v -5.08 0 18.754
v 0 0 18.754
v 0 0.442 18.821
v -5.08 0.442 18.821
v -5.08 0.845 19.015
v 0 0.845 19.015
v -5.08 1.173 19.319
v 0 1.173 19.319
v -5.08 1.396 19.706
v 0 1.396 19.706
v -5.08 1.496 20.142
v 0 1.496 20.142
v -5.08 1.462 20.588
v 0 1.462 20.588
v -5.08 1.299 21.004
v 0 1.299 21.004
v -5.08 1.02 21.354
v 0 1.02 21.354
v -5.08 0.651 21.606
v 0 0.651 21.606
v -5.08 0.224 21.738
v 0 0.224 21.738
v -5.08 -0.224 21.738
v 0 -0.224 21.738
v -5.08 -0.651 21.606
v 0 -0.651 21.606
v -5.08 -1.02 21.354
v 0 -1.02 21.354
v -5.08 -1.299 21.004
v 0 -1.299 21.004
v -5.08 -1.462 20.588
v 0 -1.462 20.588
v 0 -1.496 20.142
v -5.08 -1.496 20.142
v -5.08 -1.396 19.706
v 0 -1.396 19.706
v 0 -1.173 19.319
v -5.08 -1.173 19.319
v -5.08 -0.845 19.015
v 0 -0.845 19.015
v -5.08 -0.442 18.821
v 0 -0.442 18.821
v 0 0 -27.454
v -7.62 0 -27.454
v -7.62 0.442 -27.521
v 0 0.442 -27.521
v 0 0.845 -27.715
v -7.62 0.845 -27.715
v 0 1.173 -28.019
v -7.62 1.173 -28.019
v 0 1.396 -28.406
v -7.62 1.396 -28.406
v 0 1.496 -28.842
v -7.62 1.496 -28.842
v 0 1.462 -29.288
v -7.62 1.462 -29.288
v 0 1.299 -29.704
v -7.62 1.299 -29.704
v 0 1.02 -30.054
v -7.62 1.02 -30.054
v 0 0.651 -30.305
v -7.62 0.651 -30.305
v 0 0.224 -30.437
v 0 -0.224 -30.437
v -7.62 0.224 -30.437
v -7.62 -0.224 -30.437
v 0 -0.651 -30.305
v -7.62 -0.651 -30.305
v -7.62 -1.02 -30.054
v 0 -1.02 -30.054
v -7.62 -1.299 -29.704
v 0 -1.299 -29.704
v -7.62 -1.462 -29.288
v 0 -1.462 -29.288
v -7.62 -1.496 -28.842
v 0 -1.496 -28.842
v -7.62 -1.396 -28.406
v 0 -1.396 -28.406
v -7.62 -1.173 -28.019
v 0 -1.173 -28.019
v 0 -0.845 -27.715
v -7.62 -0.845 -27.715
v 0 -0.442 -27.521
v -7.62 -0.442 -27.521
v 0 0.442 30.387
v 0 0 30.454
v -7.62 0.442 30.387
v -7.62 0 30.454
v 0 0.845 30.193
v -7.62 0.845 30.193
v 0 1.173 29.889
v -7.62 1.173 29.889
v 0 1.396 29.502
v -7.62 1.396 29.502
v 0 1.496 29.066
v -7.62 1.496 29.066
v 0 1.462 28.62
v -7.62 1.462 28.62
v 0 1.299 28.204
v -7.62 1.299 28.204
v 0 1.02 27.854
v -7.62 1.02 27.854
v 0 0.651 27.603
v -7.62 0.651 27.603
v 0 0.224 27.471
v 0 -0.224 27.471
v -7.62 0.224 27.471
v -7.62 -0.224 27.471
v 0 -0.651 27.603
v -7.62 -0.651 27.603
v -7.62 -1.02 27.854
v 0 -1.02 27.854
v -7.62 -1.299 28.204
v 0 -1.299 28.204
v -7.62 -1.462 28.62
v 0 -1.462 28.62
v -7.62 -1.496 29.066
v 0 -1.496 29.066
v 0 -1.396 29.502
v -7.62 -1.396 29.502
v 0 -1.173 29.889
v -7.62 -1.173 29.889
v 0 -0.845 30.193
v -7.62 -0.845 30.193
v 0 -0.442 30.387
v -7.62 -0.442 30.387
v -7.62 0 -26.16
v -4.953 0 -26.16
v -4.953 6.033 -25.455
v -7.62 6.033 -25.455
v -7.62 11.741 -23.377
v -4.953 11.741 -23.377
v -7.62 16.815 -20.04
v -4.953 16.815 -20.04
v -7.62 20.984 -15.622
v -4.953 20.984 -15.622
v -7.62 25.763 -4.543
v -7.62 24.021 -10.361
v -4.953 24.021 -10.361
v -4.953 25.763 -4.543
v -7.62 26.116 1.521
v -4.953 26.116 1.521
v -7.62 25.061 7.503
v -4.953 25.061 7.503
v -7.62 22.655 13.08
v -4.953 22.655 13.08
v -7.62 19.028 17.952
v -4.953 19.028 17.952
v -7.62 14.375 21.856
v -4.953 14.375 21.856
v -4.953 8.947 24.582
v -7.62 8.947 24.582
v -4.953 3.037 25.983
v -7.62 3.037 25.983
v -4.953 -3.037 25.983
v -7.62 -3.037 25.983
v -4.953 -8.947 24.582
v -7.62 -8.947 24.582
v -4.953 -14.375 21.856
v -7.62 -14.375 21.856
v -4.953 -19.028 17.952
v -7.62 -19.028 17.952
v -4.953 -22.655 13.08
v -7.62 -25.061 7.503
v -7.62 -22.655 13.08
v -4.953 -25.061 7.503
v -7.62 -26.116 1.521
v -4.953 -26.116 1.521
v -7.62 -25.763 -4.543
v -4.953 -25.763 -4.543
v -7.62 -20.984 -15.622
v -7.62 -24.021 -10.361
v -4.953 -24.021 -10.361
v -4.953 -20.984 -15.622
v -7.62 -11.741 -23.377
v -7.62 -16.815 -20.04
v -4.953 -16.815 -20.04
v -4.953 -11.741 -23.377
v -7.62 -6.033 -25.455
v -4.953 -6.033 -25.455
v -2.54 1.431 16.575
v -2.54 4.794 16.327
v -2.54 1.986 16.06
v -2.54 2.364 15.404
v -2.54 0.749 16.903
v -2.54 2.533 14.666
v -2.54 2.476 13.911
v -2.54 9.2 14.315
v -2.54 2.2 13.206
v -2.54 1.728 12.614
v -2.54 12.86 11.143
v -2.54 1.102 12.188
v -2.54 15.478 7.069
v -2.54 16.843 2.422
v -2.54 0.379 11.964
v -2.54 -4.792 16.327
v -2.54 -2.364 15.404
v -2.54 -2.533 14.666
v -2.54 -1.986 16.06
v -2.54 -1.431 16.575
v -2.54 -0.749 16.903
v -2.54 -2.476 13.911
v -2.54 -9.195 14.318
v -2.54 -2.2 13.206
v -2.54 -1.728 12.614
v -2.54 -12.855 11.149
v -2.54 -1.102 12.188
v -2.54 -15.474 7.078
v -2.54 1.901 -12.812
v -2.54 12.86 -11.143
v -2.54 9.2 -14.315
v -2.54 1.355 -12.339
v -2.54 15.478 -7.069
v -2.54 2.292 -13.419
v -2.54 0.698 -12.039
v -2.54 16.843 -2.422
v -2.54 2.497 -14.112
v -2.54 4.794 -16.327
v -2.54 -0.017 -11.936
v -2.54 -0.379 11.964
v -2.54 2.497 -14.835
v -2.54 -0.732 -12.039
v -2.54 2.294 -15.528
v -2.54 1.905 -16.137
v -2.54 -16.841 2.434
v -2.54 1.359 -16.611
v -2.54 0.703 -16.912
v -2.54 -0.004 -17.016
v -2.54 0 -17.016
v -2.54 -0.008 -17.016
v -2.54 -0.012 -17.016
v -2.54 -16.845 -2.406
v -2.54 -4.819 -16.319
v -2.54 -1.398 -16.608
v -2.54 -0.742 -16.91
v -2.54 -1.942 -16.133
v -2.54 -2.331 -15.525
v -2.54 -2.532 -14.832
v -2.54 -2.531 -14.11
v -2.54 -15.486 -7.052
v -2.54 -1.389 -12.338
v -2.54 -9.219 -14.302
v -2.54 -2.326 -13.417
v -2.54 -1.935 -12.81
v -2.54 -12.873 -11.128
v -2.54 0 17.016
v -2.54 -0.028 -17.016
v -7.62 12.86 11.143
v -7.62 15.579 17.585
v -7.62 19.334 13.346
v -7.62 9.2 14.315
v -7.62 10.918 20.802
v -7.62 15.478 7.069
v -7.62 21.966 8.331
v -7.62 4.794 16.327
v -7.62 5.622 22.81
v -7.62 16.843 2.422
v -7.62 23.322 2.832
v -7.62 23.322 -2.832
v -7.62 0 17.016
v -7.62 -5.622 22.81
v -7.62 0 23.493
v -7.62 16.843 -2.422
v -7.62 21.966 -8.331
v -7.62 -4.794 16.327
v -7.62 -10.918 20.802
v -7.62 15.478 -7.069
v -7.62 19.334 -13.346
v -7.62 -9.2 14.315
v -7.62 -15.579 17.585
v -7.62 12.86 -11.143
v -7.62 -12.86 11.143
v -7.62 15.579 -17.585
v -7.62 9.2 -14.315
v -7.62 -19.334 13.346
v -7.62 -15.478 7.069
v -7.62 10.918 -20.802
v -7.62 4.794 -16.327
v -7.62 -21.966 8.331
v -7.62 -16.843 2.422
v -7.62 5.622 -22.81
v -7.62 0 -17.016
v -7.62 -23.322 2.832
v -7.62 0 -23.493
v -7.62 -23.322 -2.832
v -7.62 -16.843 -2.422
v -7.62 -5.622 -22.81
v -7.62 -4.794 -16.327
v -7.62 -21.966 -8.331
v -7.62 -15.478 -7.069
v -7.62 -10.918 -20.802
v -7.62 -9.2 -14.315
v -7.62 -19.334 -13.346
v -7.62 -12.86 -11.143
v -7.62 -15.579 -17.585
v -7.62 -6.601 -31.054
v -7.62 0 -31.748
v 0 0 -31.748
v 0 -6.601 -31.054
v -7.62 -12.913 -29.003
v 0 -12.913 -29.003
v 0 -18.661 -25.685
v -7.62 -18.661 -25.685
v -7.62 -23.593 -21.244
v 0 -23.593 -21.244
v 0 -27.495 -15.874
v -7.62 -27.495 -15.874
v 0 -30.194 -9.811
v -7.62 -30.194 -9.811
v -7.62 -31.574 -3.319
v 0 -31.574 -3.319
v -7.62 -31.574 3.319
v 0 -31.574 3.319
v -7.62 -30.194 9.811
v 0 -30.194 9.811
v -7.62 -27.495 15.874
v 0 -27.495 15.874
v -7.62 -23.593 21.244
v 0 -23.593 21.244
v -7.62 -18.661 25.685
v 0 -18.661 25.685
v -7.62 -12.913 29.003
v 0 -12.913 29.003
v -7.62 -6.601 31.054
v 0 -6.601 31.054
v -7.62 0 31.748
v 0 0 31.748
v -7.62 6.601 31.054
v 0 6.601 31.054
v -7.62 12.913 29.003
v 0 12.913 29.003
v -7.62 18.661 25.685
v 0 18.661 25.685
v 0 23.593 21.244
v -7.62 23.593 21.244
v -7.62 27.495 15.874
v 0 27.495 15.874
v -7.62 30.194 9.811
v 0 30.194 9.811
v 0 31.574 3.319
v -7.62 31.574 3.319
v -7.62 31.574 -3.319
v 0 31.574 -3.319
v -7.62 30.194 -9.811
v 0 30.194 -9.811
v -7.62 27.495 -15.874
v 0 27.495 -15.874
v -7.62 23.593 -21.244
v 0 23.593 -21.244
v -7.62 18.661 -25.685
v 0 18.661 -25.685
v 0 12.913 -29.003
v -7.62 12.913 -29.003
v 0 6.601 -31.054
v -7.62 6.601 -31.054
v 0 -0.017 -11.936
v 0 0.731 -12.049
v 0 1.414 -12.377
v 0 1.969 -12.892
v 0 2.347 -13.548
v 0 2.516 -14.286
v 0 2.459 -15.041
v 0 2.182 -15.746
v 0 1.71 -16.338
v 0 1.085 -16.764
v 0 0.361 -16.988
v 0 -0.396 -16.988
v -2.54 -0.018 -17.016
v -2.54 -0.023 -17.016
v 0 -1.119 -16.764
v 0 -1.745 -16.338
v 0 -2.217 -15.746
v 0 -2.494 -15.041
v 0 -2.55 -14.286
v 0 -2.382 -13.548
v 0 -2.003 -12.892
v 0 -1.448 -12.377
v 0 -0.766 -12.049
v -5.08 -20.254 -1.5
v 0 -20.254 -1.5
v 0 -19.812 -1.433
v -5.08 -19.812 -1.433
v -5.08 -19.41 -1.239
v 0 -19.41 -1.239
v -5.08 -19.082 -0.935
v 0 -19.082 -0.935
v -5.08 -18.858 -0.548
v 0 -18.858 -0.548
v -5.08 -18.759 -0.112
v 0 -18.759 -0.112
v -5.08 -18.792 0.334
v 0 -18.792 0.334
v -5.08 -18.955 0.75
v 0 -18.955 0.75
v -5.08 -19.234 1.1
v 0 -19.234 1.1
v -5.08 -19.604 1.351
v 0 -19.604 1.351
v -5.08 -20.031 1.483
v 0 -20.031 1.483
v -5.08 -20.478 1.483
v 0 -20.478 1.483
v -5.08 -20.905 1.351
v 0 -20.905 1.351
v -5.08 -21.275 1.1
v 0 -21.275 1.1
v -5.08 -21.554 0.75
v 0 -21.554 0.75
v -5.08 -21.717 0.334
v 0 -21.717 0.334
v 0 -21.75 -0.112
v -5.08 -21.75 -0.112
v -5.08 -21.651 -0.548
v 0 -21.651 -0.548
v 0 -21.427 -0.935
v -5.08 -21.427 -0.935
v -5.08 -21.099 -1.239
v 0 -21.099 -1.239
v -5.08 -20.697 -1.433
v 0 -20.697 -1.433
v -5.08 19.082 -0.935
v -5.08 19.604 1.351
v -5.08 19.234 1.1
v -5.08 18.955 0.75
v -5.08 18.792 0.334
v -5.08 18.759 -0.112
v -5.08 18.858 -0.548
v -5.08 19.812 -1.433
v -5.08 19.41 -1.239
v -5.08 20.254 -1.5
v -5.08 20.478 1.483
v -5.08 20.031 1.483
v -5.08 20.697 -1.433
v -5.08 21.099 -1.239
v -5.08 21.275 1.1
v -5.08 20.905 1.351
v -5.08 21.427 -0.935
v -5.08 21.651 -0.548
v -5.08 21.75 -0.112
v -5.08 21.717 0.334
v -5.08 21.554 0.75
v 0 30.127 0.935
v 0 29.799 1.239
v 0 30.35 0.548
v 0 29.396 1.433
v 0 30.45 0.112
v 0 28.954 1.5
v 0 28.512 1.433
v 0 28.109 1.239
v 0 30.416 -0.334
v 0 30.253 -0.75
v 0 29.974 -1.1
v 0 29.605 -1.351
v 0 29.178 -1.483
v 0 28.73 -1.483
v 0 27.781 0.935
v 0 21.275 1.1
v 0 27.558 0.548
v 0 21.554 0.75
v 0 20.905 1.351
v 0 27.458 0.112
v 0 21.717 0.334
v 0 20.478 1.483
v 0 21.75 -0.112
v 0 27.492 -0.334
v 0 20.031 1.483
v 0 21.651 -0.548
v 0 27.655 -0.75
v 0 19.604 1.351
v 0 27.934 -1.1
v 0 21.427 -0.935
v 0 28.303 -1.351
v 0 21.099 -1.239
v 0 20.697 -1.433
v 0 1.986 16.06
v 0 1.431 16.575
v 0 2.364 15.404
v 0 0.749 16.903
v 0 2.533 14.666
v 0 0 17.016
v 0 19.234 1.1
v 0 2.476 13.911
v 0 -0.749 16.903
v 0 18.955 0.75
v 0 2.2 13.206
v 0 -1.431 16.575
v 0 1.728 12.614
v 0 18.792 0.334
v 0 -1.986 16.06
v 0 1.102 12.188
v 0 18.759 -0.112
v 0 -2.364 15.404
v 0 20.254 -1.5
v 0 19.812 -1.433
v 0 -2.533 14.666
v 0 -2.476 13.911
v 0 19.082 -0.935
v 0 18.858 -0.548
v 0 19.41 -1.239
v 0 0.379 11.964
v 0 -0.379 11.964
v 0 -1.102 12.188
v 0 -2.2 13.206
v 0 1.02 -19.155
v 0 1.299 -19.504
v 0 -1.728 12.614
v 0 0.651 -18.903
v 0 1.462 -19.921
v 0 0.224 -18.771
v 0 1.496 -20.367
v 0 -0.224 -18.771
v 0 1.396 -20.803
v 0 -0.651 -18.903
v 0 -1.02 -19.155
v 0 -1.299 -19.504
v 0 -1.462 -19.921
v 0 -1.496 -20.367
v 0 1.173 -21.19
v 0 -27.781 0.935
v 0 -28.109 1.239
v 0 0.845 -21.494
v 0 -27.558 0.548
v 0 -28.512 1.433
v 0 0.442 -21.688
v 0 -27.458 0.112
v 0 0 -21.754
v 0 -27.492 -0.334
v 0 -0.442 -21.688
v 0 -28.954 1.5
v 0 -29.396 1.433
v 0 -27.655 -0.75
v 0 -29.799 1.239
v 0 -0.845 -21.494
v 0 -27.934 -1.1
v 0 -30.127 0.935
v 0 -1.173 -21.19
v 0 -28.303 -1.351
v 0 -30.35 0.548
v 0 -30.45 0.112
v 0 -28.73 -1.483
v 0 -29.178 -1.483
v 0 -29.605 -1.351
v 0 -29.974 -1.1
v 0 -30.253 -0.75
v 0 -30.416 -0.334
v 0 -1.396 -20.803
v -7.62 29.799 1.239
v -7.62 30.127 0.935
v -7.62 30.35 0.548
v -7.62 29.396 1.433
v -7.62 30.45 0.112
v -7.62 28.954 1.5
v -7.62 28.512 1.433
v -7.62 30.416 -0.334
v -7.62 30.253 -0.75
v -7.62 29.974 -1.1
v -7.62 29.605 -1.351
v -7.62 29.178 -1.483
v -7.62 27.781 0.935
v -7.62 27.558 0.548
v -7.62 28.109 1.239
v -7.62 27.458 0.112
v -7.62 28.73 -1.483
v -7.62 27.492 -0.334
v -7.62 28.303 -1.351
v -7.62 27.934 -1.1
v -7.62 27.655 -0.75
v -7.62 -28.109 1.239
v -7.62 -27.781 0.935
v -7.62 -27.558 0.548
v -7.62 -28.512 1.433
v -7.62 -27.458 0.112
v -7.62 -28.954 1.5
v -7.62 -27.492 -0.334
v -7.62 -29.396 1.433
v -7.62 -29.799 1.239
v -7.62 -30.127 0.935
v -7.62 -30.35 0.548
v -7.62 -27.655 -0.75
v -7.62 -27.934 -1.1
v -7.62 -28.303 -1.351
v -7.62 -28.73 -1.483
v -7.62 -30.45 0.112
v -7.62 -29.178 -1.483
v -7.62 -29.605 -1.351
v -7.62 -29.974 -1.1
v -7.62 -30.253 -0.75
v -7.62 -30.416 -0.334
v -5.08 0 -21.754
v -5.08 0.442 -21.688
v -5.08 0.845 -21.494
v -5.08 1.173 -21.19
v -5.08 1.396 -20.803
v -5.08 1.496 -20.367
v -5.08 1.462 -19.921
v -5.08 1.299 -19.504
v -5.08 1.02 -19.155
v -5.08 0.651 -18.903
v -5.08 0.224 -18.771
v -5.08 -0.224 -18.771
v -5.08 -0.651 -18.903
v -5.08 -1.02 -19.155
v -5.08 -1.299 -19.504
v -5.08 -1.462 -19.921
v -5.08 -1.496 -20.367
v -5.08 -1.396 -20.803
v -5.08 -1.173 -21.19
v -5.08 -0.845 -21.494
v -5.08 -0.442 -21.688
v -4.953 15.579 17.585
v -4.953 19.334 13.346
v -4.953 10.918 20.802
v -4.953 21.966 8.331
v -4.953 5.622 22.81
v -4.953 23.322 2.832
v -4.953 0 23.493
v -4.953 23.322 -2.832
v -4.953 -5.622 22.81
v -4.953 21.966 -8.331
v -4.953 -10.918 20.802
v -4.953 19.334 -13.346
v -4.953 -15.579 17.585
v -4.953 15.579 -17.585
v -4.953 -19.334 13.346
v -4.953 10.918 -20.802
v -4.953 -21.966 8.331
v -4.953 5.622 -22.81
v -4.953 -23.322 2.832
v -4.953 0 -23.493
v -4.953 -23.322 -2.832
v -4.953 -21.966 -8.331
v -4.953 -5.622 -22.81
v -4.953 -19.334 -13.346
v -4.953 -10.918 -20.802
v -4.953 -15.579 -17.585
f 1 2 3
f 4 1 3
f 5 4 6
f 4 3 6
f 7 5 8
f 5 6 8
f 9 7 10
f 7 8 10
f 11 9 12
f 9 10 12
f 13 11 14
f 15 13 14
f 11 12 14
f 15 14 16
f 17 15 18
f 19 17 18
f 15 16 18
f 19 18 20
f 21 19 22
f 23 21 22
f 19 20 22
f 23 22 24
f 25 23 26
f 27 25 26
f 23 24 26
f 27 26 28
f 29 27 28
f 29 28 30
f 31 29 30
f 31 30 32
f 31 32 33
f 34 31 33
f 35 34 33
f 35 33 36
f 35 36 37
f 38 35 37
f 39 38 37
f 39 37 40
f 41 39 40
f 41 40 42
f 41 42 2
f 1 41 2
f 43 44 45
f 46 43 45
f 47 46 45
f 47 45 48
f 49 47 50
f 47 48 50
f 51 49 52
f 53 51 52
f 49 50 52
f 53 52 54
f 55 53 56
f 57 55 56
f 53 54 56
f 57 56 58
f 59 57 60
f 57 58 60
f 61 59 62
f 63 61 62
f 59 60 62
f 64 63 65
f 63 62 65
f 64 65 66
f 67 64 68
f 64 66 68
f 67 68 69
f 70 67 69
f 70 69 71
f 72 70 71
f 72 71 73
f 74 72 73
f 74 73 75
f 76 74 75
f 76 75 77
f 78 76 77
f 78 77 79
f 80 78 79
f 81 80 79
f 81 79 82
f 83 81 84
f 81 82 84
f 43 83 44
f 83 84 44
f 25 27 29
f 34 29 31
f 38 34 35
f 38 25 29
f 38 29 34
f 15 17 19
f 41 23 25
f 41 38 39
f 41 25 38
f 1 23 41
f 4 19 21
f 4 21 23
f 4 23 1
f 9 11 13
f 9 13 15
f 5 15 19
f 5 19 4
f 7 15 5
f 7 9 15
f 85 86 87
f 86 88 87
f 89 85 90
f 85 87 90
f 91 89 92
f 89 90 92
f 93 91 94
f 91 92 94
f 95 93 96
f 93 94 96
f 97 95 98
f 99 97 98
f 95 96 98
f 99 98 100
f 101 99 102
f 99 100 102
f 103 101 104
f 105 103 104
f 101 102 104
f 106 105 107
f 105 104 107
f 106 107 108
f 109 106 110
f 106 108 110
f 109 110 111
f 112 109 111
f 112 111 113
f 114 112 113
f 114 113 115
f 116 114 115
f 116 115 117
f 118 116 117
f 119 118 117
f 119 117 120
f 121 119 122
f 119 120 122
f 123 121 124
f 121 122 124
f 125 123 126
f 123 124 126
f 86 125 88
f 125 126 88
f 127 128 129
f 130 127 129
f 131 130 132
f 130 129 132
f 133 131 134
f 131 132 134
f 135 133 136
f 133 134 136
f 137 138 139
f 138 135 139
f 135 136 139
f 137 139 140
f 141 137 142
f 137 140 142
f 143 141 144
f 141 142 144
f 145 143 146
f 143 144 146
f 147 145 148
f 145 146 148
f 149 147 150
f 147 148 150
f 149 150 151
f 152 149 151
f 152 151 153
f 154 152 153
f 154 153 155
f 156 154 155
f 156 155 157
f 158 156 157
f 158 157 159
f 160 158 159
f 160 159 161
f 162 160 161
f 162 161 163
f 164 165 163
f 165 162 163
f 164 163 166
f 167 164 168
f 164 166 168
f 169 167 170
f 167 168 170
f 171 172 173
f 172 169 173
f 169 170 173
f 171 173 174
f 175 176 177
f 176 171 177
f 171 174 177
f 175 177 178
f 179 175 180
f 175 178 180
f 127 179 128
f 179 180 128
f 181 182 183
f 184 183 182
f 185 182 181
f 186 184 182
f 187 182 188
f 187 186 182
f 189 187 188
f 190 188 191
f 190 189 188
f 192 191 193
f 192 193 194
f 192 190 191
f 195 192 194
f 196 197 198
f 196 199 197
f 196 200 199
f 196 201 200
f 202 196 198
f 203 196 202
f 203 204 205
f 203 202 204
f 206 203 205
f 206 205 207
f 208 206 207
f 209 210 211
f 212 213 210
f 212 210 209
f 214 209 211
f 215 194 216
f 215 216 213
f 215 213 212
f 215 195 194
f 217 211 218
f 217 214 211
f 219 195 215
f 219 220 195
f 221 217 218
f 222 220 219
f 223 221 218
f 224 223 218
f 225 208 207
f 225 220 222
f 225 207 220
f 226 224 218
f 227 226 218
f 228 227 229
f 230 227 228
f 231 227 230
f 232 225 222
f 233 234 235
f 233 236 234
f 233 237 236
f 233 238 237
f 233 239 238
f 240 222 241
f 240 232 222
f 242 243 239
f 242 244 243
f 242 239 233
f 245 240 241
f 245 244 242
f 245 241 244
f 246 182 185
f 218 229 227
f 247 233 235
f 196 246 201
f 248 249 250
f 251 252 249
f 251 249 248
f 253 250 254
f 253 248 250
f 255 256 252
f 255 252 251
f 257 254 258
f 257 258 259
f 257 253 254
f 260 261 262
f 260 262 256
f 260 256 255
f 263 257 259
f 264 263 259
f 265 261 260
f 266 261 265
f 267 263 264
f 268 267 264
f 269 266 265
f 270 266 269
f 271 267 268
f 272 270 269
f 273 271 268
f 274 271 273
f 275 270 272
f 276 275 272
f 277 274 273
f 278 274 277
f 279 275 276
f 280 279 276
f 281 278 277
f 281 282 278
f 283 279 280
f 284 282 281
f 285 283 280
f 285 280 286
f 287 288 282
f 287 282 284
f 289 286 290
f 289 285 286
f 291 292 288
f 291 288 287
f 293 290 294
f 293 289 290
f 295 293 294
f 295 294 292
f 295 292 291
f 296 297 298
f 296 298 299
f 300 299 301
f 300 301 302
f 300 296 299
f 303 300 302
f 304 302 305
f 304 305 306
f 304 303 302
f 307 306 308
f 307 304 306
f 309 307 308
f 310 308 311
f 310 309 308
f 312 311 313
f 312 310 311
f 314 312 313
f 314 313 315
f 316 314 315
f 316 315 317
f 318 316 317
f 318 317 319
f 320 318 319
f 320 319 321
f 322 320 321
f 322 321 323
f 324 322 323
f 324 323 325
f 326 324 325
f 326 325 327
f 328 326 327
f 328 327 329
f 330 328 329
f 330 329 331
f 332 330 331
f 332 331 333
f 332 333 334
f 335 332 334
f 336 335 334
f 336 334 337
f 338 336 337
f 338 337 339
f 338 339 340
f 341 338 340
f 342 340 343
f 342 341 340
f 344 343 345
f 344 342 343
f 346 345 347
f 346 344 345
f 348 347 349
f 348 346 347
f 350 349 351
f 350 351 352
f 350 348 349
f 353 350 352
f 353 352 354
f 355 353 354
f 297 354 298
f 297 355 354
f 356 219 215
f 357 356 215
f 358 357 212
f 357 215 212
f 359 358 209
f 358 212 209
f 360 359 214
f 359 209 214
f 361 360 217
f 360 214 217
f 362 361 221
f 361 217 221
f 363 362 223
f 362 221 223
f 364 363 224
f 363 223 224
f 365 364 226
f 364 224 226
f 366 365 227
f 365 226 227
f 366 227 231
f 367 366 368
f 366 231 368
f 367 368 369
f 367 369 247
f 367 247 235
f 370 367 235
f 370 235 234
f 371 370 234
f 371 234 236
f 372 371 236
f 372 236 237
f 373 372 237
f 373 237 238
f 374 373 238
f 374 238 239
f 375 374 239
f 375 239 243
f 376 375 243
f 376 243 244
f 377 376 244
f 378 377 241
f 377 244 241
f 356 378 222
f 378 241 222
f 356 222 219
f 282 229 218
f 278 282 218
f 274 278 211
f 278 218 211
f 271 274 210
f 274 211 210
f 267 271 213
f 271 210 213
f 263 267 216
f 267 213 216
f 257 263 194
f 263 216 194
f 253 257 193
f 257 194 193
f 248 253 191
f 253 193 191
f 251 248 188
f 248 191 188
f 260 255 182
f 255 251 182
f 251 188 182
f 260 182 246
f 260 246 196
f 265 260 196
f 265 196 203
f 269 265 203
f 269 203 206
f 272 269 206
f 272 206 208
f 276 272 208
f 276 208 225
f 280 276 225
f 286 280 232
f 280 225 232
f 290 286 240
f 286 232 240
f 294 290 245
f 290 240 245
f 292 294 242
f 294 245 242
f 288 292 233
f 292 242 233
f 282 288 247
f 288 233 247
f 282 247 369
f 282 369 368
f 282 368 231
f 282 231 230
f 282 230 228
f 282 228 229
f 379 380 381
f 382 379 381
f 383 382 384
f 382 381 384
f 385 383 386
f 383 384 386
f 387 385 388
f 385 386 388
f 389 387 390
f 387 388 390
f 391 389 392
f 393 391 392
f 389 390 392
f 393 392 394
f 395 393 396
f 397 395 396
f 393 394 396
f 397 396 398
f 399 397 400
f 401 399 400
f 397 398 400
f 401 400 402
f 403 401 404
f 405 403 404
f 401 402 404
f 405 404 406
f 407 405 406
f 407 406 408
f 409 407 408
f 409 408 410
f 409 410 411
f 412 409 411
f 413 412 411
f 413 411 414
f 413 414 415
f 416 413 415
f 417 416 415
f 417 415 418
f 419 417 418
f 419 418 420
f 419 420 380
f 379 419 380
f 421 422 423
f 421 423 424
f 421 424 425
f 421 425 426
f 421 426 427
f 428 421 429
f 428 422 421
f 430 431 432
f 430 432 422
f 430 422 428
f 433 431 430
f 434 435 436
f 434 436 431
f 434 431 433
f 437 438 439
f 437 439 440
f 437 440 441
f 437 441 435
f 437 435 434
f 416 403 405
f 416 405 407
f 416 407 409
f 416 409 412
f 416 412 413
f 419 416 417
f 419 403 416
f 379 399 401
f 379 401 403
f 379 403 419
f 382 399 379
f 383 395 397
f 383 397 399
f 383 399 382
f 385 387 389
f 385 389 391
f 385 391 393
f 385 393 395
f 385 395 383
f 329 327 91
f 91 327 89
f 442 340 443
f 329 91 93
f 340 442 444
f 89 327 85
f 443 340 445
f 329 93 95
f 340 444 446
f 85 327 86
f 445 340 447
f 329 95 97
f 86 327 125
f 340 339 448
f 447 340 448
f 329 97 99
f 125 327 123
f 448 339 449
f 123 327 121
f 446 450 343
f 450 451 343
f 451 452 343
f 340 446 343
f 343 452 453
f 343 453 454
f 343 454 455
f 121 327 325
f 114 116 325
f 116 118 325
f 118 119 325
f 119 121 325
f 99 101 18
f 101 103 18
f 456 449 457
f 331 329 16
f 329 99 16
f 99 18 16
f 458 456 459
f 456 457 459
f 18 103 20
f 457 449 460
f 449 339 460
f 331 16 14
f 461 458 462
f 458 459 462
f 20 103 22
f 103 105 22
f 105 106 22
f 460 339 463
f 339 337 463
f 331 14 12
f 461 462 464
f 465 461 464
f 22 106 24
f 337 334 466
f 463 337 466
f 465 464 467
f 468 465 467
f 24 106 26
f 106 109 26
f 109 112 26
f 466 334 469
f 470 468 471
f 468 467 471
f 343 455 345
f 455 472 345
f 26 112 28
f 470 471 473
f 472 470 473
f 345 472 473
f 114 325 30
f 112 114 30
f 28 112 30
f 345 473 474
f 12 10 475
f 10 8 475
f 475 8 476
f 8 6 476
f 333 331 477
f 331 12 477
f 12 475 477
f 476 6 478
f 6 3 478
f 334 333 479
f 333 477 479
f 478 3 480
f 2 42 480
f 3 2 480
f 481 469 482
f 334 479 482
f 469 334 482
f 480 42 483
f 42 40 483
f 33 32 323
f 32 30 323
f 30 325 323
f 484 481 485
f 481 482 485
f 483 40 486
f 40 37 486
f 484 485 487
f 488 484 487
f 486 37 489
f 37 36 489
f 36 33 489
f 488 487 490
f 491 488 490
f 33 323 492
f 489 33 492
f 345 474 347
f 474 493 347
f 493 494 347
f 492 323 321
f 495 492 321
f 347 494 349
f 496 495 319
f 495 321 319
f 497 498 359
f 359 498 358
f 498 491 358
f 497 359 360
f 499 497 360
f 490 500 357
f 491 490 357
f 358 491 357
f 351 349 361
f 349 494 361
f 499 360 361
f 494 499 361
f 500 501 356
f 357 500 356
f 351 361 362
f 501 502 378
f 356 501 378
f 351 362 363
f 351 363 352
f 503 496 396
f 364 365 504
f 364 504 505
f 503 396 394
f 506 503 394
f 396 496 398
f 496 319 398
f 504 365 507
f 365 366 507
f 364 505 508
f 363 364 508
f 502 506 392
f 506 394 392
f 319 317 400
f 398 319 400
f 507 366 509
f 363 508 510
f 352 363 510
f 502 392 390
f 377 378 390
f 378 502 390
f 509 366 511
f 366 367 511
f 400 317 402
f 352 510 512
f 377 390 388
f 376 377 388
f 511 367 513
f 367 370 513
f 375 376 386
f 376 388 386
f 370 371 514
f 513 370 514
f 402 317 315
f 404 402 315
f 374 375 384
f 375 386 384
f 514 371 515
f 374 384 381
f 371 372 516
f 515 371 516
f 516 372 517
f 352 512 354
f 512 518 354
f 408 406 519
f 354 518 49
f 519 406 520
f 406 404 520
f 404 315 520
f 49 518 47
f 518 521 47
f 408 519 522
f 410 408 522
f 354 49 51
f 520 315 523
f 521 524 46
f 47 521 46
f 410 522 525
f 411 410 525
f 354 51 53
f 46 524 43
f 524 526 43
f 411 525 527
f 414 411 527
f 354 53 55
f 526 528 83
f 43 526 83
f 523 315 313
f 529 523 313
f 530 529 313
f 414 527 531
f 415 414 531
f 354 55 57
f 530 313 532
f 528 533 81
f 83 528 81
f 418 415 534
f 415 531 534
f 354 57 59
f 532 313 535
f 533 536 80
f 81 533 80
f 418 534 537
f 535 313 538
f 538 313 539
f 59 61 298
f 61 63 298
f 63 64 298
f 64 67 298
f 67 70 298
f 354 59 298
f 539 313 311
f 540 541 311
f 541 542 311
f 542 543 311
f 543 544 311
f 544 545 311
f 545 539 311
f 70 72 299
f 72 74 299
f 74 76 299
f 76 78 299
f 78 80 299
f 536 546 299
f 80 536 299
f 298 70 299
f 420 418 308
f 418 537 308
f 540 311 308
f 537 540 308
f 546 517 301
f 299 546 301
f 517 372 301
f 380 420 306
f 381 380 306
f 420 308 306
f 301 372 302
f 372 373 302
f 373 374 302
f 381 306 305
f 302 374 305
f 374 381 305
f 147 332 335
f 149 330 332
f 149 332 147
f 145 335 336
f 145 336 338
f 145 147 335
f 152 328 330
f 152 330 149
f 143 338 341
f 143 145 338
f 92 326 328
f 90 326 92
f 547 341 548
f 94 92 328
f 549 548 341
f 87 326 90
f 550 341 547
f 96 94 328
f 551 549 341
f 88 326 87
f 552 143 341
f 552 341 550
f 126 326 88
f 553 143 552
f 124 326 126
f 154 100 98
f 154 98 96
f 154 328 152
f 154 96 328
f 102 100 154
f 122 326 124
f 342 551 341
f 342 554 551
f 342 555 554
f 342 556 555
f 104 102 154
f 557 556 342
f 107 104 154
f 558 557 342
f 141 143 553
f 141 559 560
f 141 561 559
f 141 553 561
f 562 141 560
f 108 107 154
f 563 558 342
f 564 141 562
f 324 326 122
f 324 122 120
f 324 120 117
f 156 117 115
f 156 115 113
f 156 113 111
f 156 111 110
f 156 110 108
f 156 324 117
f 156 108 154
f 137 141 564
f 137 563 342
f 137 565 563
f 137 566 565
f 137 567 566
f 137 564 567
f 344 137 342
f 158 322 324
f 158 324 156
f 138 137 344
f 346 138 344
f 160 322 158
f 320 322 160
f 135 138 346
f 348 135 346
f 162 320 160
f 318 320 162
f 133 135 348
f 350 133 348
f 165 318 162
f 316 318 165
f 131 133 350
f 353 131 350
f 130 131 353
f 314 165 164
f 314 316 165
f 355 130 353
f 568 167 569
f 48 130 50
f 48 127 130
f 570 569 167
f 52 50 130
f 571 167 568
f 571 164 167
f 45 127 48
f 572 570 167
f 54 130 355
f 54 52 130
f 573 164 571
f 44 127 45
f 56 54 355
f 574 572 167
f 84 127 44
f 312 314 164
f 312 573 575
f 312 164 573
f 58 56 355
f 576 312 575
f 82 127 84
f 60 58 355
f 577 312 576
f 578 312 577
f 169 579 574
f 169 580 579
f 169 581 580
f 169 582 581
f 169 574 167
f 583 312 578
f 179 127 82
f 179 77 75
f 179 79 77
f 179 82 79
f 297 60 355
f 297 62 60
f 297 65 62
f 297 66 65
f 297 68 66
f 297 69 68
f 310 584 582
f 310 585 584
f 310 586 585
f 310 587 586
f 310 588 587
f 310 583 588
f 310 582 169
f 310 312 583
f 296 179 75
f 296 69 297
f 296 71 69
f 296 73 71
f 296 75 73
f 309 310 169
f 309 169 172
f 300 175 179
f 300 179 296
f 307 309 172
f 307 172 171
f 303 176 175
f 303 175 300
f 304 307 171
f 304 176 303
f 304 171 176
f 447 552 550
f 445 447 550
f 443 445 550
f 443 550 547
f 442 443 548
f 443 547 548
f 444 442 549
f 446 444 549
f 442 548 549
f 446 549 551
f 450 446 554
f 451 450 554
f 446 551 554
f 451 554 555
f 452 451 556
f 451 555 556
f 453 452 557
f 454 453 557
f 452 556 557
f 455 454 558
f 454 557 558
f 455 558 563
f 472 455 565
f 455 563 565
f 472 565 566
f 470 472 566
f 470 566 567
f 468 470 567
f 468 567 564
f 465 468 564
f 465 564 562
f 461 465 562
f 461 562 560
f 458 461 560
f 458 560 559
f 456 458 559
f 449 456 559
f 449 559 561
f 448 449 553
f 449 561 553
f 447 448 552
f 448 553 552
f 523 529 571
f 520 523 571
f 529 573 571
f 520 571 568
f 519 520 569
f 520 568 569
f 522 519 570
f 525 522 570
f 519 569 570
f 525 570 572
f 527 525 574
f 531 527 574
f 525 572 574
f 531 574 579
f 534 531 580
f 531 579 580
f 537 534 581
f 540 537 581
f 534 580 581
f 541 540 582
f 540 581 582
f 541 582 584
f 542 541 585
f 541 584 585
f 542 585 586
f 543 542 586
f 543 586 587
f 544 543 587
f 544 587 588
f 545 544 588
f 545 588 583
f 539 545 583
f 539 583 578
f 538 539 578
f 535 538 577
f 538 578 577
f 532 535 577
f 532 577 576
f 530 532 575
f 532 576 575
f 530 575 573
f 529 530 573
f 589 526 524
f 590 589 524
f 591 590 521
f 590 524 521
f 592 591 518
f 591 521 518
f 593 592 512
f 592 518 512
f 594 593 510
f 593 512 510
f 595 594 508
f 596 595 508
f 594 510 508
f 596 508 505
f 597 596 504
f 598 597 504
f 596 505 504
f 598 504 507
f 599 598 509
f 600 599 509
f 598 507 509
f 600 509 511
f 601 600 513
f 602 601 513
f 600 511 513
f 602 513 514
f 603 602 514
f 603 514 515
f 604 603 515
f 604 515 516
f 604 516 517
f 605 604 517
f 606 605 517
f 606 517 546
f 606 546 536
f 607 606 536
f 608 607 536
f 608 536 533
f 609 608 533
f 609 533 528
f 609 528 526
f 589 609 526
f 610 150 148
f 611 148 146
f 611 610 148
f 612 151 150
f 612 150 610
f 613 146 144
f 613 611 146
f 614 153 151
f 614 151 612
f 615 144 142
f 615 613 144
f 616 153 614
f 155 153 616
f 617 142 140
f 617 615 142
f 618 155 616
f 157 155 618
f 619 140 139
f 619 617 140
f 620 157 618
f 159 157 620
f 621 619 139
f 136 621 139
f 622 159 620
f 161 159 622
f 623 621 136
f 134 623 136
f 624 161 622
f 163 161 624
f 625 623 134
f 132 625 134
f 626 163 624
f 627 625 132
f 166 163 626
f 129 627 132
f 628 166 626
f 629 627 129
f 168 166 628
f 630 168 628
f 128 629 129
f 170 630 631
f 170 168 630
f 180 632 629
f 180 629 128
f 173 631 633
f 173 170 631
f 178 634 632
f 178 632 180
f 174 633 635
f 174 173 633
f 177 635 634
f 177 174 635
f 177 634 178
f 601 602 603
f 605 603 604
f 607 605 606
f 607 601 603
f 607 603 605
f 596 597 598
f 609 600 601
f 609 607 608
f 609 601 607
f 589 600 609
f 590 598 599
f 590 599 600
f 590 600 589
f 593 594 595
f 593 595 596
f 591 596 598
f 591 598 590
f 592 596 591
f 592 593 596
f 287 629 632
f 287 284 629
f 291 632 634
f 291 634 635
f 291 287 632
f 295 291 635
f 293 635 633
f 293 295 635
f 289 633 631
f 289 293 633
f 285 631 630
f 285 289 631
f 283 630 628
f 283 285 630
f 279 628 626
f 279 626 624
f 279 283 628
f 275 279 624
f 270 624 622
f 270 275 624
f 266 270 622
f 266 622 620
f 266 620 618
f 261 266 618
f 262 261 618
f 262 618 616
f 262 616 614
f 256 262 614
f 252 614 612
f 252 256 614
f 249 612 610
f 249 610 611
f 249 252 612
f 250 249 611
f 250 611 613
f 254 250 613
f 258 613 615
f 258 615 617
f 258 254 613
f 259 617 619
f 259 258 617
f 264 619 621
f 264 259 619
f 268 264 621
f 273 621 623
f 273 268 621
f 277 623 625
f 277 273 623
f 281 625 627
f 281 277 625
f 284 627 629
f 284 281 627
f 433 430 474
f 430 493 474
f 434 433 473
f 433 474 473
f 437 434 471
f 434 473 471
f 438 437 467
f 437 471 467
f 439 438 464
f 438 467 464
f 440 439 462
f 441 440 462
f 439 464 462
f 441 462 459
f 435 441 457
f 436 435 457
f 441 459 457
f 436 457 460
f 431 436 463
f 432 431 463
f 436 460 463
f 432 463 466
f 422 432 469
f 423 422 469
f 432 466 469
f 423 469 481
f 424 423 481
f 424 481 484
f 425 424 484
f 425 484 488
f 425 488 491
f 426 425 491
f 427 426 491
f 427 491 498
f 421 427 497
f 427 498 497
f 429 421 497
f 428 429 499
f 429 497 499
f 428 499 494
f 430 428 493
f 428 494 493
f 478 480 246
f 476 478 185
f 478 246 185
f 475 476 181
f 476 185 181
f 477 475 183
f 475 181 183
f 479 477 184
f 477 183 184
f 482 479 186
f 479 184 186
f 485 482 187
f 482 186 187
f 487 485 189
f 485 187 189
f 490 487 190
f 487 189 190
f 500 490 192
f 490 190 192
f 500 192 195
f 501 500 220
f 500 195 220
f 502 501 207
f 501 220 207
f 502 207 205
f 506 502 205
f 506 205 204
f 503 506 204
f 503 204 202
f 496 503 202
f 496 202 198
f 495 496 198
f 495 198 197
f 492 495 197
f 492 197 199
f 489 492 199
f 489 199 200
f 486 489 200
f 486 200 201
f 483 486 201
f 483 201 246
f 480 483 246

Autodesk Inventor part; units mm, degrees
ref_plane "YZ Plane" through (0, 0, 0) normal (1, 0, 0) x (0, 1, 0)
ref_plane "XZ Plane" through (0, 0, 0) normal (0, 1, 0) x (-1, 0, 0)
ref_plane "XY Plane" through (0, 0, 0) normal (0, 0, 1) x (1, 0, 0)
sketch "Sketch1" plane through (0, 0, 0) normal (0, 1, 0) x (-1, 0, 0)
  line L0 (0, 0) -> (0, -31.748)
  line L1 (0, -31.748) -> (7.62, -31.748)
  line L2 (7.62, -31.748) -> (7.62, -26.16)
  line L3 (7.62, -26.16) -> (4.953, -26.16)
  line L4 (4.953, -26.16) -> (4.953, -23.493)
  line L5 (4.953, -23.493) -> (7.62, -23.493)
  line L6 (7.62, -23.493) -> (7.62, -17.016)
  line L7 (7.62, -17.016) -> (2.54, -17.016)
  line L8 (2.54, -17.016) -> (2.54, 0)
  line L9 (0, 0) -> (2.54, 0)
  dimension "d0" = 31.748
  dimension "d1" = 7.62
  dimension "d2" = 5.588
  dimension "d3" = 2.667
  dimension "d4" = 2.667
  dimension "d5" = 6.477
  dimension "d6" = 5.08
  dimension "d7" = 2.54
revolve "Revolution1" add sketch "Sketch1" angle 360 about axis through (0, 0, 0) along (-1, 0, 0)
sketch "Sketch2" plane through (-7.62, 0, 0) normal (-1, 0, 0) x (0, 0, 1)
  circle A0 centre (28.954, 0) radius 1.5
  circle A1 centre (0, 0) radius 31.748 projected
  line L0 (31.748, 0) -> (26.16, 0)
  circle A2 centre (0, 0) radius 26.16 projected
  circle A3 centre (0, 28.954) radius 1.5
  circle A4 centre (-28.954, 0) radius 1.5
  circle A5 centre (0, -28.954) radius 1.5
  dimension "d9" = 3
  dimension "d12" = 360
extrude "Extrusion1" cut sketch "Sketch2" against normal blind 12.7 contours L0 A0 | A0 L0 | A3 | A4 | A5
sketch "Sketch3" plane through (0, 0, 0) normal (1, 0, 0) x (0, 0, -1)
  circle A0 centre (0, 0) radius 23.493 projected
  circle A1 centre (0, 0) radius 20.2545
  circle A2 centre (20.2545, 0) radius 1.5
  circle A3 centre (0, 20.2545) radius 1.5
  circle A4 centre (-20.2545, 0) radius 1.5
  circle A5 centre (0, -20.2545) radius 1.5
  dimension "d17" = 3.2385
  dimension "d18" = 3
  dimension "d21" = 360
sketch "Sketch4" plane through (-7.62, 0, 0) normal (-1, 0, 0) x (0, 0, 1)
  circle A0 centre (0, 0) radius 17.016 projected
  circle A1 centre (0, 0) radius 23.493 projected
  dimension "d16" = 6.477
extrude "Extrusion2" cut sketch "Sketch3" against normal blind 5.08 contours A1 A2 | A1 A2 | A3 A1 | A1 A3 | A5 A1 | A1 A5 | A4 A1 | A1 A4
sketch "Sketch5" plane through (-2.54, 0, 0) normal (-1, 0, 0) x (0, 0, 1)
  circle A0 centre (0, 0) radius 17.016 projected
  line L0 (-17.016, 0) -> (17.016, 0)
  line L1 (-14.478, -9.9949) -> (14.478, -9.9949)
  line L2 (-14.478, 9.9949) -> (14.478, 9.9949)
  line L3 (14.478, 9.9949) -> (14.478, -9.9949)
  line L4 (-14.478, 9.9949) -> (-14.478, -9.9949)
  arc A1 (16.8267, -2.5309) -> (16.8267, 2.5309) centre (0, 0) ccw
  point P0 (0, 9.9949)
  point P1 (14.478, 0)
  dimension "d25" = 28.956
  dimension "d26" = 19.9898
sketch "Sketch8" plane through (-7.62, 0, 0) normal (-1, 0, 0) x (0, 0, 1)
  arc A0 (-17.016, 0) -> (-17.016, 0) centre (17.016, 0) ccw projected
  arc A1 (-16.8238, -2.55) -> (-16.829, 2.5158) centre (-17.016, -0.0173) ccw projected
  circle A2 centre (-14.476, -0.0173) radius 2.54
  circle A3 centre (14.476, 0) radius 2.54
  point P0 (0, 0)
extrude "Extrusion4" cut sketch "Sketch8" against normal blind 25.4 contours A2 A1 | A2 A1 | A3
properties part number "LED holder 2"
